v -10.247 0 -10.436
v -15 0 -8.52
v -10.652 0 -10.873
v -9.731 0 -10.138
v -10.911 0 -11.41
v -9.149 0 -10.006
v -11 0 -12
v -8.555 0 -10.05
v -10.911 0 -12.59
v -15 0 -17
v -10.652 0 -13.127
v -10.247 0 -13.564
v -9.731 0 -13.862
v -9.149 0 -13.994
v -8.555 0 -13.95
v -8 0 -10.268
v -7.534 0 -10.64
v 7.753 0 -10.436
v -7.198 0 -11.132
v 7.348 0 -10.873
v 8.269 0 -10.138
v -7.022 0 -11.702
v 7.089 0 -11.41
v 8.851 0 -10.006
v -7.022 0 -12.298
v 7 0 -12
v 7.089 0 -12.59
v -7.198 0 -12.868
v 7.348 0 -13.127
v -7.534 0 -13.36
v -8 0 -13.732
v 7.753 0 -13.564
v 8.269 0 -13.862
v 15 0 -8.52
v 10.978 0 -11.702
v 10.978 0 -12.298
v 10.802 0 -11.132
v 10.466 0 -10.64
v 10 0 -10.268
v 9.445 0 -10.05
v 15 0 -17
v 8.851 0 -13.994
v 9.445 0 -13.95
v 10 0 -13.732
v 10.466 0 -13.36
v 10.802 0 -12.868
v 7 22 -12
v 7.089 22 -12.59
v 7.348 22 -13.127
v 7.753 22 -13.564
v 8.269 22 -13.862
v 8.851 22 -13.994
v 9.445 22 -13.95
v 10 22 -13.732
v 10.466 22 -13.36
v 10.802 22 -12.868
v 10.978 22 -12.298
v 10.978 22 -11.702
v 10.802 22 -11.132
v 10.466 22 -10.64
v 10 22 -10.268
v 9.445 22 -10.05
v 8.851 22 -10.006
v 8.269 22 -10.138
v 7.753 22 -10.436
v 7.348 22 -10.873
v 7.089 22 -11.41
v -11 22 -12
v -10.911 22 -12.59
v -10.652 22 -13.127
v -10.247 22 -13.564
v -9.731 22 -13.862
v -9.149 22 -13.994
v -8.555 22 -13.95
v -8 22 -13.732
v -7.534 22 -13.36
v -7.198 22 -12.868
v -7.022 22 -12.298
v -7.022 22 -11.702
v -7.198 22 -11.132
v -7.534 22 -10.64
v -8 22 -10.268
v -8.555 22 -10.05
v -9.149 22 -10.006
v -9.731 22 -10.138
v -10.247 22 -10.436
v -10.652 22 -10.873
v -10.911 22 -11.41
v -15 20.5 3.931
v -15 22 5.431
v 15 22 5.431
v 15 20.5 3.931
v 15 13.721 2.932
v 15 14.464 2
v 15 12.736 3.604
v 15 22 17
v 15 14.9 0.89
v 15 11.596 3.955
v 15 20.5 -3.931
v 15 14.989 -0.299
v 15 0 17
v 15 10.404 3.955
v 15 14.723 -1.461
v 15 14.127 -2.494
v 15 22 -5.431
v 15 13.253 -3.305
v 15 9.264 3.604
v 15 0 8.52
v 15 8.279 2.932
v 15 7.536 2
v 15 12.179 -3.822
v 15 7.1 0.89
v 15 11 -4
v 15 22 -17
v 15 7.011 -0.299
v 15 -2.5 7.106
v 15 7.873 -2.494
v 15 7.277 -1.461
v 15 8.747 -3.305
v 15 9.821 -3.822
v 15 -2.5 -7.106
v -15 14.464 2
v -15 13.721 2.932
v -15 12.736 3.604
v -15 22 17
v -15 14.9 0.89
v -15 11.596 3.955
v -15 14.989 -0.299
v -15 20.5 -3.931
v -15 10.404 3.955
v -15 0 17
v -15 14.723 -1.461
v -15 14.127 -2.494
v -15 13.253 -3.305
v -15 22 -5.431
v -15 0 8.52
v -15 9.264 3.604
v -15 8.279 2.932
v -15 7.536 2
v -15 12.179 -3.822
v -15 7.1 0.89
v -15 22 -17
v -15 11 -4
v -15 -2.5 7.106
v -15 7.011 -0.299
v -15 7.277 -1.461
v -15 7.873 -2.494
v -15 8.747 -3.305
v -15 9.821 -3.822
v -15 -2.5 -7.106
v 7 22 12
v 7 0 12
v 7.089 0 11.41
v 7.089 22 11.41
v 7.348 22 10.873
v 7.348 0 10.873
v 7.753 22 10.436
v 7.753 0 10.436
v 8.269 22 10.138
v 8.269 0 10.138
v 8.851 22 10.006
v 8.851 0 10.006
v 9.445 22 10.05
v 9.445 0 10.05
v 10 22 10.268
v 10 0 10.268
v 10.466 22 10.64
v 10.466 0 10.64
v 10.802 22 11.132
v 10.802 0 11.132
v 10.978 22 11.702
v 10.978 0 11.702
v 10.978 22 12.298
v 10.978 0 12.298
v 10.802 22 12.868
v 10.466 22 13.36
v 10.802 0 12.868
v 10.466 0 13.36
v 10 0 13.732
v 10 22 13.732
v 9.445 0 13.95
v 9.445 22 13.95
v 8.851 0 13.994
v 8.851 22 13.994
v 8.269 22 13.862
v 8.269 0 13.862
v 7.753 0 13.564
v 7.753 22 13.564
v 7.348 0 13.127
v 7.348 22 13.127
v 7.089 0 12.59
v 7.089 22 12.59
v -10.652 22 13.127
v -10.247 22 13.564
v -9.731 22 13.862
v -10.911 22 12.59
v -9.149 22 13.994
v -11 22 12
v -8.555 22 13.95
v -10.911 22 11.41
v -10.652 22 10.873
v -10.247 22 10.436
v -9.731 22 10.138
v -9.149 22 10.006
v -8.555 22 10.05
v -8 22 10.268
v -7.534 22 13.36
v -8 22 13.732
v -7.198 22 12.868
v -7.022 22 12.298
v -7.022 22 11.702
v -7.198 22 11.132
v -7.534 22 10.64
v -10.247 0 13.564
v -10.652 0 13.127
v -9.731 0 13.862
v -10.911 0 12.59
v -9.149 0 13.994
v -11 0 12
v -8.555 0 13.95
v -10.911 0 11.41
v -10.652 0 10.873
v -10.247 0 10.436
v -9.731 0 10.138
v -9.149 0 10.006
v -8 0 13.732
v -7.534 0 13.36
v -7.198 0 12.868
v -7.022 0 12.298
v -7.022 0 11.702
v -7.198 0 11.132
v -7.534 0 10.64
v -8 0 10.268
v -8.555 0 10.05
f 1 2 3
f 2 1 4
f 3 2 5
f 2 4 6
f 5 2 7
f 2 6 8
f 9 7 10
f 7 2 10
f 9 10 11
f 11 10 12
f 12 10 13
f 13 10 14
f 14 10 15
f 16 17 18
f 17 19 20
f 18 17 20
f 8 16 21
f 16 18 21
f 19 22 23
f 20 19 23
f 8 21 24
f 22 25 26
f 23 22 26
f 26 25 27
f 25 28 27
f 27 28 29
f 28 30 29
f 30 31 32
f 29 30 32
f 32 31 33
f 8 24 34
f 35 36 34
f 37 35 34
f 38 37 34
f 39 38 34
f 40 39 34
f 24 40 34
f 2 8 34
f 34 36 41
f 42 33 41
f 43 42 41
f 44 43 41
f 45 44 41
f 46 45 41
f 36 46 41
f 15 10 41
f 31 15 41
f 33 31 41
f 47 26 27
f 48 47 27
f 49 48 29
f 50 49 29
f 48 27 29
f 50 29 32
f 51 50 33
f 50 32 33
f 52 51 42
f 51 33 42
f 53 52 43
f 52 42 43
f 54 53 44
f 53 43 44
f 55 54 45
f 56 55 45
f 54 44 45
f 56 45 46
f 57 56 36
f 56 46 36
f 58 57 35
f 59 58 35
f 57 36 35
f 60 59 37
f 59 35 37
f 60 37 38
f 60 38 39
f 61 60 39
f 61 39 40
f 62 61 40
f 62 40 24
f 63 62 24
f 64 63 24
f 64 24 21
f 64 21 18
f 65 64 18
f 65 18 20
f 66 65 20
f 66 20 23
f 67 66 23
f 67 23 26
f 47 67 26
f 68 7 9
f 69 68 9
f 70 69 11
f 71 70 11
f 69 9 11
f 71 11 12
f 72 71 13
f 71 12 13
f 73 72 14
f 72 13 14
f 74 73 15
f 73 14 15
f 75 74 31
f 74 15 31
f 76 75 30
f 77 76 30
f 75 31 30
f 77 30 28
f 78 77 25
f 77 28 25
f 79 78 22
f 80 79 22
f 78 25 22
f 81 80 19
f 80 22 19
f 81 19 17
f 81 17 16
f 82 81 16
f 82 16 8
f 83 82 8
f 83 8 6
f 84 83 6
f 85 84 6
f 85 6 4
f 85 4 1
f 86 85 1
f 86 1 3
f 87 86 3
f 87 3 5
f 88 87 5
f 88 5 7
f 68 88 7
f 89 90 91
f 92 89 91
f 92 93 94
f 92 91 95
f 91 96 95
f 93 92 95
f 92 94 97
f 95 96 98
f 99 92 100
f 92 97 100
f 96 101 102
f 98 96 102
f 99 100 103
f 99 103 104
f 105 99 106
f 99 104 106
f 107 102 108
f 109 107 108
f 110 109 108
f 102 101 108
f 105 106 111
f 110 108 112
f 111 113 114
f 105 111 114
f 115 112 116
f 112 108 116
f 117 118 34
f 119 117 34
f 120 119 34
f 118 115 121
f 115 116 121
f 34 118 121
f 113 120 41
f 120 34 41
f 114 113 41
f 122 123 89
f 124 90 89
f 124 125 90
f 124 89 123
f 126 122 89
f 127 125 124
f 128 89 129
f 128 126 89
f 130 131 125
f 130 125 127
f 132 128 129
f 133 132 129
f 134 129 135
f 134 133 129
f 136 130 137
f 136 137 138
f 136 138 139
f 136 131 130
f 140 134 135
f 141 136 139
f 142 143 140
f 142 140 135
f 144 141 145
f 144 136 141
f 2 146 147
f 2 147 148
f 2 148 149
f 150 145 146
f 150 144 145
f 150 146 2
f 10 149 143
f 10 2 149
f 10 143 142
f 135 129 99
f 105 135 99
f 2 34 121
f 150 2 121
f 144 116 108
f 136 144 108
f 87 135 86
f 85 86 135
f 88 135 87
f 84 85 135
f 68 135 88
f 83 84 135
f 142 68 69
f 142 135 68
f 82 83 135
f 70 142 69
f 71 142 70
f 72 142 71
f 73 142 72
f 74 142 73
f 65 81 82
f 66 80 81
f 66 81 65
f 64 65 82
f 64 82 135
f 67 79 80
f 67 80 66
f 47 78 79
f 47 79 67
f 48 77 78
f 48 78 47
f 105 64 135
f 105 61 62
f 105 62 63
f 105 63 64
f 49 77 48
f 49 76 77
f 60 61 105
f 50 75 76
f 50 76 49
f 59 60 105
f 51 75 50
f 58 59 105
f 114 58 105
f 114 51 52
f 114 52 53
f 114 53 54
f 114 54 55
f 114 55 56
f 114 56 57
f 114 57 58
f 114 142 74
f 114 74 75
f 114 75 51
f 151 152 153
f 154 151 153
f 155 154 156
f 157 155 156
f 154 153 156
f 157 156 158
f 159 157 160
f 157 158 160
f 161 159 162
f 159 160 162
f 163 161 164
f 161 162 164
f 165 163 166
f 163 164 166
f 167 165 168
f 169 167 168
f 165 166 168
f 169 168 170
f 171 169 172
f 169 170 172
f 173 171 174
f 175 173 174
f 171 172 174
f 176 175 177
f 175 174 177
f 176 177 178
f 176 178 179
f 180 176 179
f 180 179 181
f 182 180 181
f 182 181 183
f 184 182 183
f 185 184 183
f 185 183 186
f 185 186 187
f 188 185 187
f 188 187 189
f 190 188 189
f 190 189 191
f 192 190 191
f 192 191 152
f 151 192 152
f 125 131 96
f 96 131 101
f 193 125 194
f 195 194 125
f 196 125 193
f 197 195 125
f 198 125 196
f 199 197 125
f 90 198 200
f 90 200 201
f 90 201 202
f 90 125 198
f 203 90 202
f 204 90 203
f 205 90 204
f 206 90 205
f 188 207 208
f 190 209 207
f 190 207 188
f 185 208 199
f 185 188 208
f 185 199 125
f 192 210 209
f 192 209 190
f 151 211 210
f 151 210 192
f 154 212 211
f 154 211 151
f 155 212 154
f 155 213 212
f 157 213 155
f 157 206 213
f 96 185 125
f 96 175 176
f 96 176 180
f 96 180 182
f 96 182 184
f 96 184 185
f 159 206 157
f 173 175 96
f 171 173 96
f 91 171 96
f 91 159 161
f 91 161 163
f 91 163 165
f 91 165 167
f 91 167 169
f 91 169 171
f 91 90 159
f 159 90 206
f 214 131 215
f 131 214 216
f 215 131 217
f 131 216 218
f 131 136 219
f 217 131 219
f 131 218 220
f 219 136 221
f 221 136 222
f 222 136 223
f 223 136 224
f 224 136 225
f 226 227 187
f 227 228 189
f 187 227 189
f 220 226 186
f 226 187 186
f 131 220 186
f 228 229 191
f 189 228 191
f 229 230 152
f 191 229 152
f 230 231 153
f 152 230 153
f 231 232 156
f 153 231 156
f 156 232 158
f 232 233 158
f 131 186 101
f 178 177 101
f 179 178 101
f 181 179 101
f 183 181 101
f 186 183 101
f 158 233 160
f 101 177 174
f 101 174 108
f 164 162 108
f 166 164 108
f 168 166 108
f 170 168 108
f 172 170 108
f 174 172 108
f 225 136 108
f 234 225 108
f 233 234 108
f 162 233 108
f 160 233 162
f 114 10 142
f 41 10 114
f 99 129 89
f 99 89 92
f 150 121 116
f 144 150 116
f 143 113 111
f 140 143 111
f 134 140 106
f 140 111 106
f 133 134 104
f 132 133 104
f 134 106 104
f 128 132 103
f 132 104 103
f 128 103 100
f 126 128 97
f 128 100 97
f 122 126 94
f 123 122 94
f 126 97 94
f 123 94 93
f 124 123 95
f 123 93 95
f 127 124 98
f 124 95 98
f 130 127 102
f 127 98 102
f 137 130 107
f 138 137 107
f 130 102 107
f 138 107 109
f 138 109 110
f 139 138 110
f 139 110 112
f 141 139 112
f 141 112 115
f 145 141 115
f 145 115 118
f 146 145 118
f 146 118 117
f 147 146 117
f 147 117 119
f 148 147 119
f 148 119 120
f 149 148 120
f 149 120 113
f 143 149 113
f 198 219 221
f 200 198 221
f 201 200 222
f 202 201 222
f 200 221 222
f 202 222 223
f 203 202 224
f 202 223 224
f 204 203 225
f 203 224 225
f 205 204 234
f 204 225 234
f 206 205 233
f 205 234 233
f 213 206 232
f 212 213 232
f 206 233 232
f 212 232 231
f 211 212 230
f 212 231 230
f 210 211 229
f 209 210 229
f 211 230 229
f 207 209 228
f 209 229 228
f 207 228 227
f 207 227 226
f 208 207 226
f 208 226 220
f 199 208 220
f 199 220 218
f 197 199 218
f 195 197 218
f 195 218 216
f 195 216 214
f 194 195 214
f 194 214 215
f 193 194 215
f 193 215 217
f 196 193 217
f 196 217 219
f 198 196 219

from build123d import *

# Parameters (mm, degrees)
SKETCH1_W             = 30
SKETCH1_H             = 34
BOSS_EXTRUDE1_DEPTH   = 22
F_4_0MM_DOWEL_HOLE1_D = 4
BOSS_EXTRUDE2_DEPTH   = 30
SKETCH5_W             = 30
SKETCH5_H             = 10.861011286
CUT_EXTRUDE1_DEPTH    = 1.5
CHAMFER2_SIZE         = 1.5
CUT_EXTRUDE2_DEPTH    = 41.902322672


with BuildPart() as part:
    # Sketch1 → Boss-Extrude1 (new body)
    with BuildSketch(Plane(origin=(0, 0, 0), x_dir=(1, 0, 0), z_dir=(0, 1, 0))):
        Rectangle(SKETCH1_W, SKETCH1_H)
    extrude(amount=BOSS_EXTRUDE1_DEPTH)

    # Ø4.0mm Dowel Hole1 (through all)
    with Locations(Plane(origin=(0, 22, 0), x_dir=(1, 0, 0), z_dir=(0, 1, 0))):
        with Locations((9, -12), (-9, -12), (9, 12), (-9, 12)):
            Hole(F_4_0MM_DOWEL_HOLE1_D / 2)

    # Sketch4 → Boss-Extrude2 (add, through all)
    with BuildSketch(Plane(origin=(15, 0, 0), x_dir=(0, 0, -1), z_dir=(1, 0, 0))):
        Polygon((-8.519809931, 0), (8.519809931, 0), (7.106209181, -2.5), (-7.106209181, -2.5), align=None)
    extrude(amount=-BOSS_EXTRUDE2_DEPTH)

    # Sketch5 → Cut-Extrude1 (cut)
    with BuildSketch(Plane(origin=(0, 22, 0), x_dir=(1, 0, 0), z_dir=(0, 1, 0))):
        Rectangle(SKETCH5_W, SKETCH5_H)
    extrude(amount=-CUT_EXTRUDE1_DEPTH, mode=Mode.SUBTRACT)

    # Chamfer2
    chamfer2_edges = [part.edges().sort_by_distance(p)[0] for p in [
        (0, 20.5, 5.430505643),
        (0, 20.5, -5.430505643),
    ]]
    chamfer(chamfer2_edges, length=CHAMFER2_SIZE - 0.0001)  # a hair under: the kernel refuses the full size

    # Sketch8 → Cut-Extrude2 (cut, through all)
    with BuildSketch(Plane(origin=(15, 0, 0), x_dir=(0, 0, -1), z_dir=(1, 0, 0))):
        with BuildLine():
            Line((4, 11), (0, 11))
            Line((0, 11), (-4, 11))
            ThreePointArc((-4, 11), (0, 7), (4, 11))
        make_face()
        with BuildLine():
            Line((-4, 11), (0, 11))
            Line((0, 11), (4, 11))
            ThreePointArc((4, 11), (0, 15), (-4, 11))
        make_face()
    extrude(amount=-CUT_EXTRUDE2_DEPTH, mode=Mode.SUBTRACT)


solid = part.part
